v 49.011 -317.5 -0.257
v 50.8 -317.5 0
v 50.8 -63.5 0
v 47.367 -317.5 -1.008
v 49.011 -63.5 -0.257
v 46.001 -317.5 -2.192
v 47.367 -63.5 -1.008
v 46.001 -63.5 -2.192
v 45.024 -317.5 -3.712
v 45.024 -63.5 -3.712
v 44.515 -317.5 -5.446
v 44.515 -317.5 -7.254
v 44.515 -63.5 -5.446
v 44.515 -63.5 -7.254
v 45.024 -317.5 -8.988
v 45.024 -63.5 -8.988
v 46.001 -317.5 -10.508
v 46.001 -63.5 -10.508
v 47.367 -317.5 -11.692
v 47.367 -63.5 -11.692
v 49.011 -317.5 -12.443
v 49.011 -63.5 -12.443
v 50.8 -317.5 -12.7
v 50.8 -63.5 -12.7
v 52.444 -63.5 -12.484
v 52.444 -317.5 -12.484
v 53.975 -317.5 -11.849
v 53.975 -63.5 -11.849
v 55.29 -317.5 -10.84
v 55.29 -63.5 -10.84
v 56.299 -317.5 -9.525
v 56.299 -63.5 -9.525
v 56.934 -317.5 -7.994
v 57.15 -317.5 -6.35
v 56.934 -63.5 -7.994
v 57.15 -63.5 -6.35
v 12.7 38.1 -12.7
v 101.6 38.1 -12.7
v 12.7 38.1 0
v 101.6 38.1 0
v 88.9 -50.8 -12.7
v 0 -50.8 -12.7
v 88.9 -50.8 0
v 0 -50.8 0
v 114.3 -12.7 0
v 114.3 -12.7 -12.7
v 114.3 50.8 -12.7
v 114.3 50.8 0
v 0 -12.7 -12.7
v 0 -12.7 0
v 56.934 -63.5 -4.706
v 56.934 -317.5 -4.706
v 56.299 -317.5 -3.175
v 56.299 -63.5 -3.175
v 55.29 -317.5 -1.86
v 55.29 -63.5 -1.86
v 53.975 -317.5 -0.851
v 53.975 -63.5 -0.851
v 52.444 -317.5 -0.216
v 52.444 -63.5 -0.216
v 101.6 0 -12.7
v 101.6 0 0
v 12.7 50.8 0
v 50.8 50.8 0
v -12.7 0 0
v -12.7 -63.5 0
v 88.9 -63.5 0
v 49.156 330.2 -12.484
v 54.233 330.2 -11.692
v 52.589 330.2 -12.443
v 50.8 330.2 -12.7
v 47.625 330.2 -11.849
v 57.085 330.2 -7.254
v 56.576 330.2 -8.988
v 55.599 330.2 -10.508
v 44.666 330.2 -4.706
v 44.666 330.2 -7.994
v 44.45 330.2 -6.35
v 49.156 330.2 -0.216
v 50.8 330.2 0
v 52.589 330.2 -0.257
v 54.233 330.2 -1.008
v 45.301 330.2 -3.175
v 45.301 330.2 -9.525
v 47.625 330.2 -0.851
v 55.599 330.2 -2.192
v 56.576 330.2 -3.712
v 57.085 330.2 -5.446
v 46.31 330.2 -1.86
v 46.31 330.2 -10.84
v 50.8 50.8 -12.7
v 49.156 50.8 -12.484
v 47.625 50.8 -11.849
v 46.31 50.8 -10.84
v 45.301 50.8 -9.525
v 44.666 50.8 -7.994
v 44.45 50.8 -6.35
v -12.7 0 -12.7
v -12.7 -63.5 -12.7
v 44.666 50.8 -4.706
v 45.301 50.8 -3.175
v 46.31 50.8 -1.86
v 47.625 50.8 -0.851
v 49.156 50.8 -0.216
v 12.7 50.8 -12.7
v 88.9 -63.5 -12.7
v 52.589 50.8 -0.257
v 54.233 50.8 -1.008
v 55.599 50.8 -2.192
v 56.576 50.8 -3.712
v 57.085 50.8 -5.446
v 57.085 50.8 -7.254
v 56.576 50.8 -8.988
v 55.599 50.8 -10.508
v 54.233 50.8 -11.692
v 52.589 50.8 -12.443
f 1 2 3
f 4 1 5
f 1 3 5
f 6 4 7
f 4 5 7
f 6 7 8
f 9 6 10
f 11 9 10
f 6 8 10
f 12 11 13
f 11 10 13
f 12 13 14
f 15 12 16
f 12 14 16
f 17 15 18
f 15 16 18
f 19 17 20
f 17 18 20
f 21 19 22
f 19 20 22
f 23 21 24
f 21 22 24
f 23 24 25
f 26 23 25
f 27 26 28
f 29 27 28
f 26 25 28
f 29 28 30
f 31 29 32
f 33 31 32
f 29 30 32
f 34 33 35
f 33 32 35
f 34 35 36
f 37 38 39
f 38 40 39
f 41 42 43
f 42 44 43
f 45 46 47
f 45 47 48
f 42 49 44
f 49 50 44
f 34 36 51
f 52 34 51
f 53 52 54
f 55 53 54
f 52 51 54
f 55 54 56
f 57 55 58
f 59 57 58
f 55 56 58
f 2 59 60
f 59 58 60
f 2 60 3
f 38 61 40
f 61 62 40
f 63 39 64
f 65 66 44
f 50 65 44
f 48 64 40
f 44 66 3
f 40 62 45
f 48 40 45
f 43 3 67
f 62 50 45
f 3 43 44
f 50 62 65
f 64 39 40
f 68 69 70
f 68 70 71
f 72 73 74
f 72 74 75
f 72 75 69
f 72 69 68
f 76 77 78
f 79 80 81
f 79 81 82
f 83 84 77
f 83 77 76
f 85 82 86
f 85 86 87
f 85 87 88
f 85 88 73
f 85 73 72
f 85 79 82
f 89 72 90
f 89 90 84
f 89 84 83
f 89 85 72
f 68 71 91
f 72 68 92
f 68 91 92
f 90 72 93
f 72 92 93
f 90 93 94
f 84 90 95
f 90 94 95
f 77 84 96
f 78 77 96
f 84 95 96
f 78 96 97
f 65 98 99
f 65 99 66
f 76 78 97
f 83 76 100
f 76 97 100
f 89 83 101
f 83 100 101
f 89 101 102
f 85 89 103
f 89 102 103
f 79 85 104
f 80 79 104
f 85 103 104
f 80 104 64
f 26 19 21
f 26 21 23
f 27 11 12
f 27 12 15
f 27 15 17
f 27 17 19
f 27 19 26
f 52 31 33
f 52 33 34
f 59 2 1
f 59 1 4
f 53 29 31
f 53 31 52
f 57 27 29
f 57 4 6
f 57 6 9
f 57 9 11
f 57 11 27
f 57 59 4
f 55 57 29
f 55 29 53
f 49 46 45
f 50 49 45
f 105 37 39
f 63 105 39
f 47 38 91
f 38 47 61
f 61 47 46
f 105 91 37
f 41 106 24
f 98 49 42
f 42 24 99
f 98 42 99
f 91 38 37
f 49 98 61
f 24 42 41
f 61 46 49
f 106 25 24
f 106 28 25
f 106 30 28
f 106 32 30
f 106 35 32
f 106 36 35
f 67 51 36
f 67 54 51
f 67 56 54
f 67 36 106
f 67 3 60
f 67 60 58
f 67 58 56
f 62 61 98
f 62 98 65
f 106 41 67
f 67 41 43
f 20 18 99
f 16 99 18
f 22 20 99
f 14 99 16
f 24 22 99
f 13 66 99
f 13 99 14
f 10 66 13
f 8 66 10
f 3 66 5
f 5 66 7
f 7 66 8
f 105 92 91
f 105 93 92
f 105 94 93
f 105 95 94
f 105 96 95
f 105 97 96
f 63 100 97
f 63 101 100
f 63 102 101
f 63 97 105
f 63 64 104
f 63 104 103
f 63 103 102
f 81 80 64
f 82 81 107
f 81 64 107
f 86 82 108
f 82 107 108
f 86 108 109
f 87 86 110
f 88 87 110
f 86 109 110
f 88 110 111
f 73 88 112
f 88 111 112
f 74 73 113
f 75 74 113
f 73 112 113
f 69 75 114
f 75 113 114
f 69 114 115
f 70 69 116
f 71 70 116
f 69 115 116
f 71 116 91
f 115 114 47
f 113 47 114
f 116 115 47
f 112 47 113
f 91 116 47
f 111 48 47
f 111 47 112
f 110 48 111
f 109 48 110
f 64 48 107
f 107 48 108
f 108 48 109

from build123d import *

# Parameters (mm, degrees)
F0_W      = 12.7
F0_H      = 12.7
F1_DEPTH  = 101.6
F2_W      = 38.1
F2_H      = 12.7
F2_W_2    = 12.7
F3_DEPTH  = 12.7
F4_W      = 38.1
F4_H      = 12.7
F4_W_2    = 12.7
F5_DEPTH  = 12.7
F6_W      = 88.9
F6_H      = 12.7
F6_W_2    = 12.7
F7_DEPTH  = 12.7
F8_W      = 88.9
F8_H      = 12.7
F8_W_2    = 12.7
F9_DEPTH  = 12.7
F11_DEPTH = 254
F13_DEPTH = 279.4


with BuildPart() as f1:
    # F0 (on Right) → F1 (new body)
    with BuildSketch(Plane.YZ):
        with Locations((-6.35, -6.35)):
            Rectangle(F0_W, F0_H)
    extrude(amount=F1_DEPTH)

    # F2 (on face) → F3 (join)
    with BuildSketch(Plane.YZ.offset(101.6)):
        with Locations((19.05, -6.35)):
            Rectangle(F2_W, F2_H)
        with Locations((-6.35, -6.35)):
            Rectangle(F2_W_2, F2_H)
    extrude(amount=F3_DEPTH)

    # F4 (on face) → F5 (join)
    with BuildSketch(Plane(origin=(0, 0, 0), x_dir=(0, -1, 0), z_dir=(-1, 0, 0))):
        with Locations((31.75, -6.35)):
            Rectangle(F4_W, F4_H)
        with Locations((6.35, -6.35)):
            Rectangle(F4_W_2, F4_H)
    extrude(amount=F5_DEPTH)

    # F6 (on face) → F7 (join)
    with BuildSketch(Plane.XZ.offset(50.8)):
        with Locations((44.45, -6.35)):
            Rectangle(F6_W, F6_H)
        with Locations((-6.35, -6.35)):
            Rectangle(F6_W_2, F6_H)
    extrude(amount=F7_DEPTH)

    # F8 (on face) → F9 (join)
    with BuildSketch(Plane(origin=(0, 38.1, 0), x_dir=(-1, 0, 0), z_dir=(0, 1, 0))):
        with Locations((-57.15, -6.35)):
            Rectangle(F8_W, F8_H)
        with Locations((-107.95, -6.35)):
            Rectangle(F8_W_2, F8_H)
    extrude(amount=F9_DEPTH)

    # F10 (on face) → F11 (join)
    with BuildSketch(Plane.XZ.offset(63.5)):
        with BuildLine():
            ThreePointArc((50.8, -12.7), (55.290128, -10.840128), (57.15, -6.35))
            ThreePointArc((57.15, -6.35), (55.290128, -1.859872), (50.8, 0))
            ThreePointArc((50.8, 0), (44.45, -6.35), (50.8, -12.7))
        make_face()
    extrude(amount=F11_DEPTH)

    # F12 (on face) → F13 (join)
    with BuildSketch(Plane(origin=(0, 50.8, 0), x_dir=(-1, 0, 0), z_dir=(0, 1, 0))):
        with BuildLine():
            ThreePointArc((-50.8, -12.7), (-46.309872, -10.840128), (-44.45, -6.35))
            ThreePointArc((-44.45, -6.35), (-46.309872, -1.859872), (-50.8, 0))
            ThreePointArc((-50.8, 0), (-57.15, -6.35), (-50.8, -12.7))
        make_face()
    extrude(amount=F13_DEPTH)


solid = f1.part
